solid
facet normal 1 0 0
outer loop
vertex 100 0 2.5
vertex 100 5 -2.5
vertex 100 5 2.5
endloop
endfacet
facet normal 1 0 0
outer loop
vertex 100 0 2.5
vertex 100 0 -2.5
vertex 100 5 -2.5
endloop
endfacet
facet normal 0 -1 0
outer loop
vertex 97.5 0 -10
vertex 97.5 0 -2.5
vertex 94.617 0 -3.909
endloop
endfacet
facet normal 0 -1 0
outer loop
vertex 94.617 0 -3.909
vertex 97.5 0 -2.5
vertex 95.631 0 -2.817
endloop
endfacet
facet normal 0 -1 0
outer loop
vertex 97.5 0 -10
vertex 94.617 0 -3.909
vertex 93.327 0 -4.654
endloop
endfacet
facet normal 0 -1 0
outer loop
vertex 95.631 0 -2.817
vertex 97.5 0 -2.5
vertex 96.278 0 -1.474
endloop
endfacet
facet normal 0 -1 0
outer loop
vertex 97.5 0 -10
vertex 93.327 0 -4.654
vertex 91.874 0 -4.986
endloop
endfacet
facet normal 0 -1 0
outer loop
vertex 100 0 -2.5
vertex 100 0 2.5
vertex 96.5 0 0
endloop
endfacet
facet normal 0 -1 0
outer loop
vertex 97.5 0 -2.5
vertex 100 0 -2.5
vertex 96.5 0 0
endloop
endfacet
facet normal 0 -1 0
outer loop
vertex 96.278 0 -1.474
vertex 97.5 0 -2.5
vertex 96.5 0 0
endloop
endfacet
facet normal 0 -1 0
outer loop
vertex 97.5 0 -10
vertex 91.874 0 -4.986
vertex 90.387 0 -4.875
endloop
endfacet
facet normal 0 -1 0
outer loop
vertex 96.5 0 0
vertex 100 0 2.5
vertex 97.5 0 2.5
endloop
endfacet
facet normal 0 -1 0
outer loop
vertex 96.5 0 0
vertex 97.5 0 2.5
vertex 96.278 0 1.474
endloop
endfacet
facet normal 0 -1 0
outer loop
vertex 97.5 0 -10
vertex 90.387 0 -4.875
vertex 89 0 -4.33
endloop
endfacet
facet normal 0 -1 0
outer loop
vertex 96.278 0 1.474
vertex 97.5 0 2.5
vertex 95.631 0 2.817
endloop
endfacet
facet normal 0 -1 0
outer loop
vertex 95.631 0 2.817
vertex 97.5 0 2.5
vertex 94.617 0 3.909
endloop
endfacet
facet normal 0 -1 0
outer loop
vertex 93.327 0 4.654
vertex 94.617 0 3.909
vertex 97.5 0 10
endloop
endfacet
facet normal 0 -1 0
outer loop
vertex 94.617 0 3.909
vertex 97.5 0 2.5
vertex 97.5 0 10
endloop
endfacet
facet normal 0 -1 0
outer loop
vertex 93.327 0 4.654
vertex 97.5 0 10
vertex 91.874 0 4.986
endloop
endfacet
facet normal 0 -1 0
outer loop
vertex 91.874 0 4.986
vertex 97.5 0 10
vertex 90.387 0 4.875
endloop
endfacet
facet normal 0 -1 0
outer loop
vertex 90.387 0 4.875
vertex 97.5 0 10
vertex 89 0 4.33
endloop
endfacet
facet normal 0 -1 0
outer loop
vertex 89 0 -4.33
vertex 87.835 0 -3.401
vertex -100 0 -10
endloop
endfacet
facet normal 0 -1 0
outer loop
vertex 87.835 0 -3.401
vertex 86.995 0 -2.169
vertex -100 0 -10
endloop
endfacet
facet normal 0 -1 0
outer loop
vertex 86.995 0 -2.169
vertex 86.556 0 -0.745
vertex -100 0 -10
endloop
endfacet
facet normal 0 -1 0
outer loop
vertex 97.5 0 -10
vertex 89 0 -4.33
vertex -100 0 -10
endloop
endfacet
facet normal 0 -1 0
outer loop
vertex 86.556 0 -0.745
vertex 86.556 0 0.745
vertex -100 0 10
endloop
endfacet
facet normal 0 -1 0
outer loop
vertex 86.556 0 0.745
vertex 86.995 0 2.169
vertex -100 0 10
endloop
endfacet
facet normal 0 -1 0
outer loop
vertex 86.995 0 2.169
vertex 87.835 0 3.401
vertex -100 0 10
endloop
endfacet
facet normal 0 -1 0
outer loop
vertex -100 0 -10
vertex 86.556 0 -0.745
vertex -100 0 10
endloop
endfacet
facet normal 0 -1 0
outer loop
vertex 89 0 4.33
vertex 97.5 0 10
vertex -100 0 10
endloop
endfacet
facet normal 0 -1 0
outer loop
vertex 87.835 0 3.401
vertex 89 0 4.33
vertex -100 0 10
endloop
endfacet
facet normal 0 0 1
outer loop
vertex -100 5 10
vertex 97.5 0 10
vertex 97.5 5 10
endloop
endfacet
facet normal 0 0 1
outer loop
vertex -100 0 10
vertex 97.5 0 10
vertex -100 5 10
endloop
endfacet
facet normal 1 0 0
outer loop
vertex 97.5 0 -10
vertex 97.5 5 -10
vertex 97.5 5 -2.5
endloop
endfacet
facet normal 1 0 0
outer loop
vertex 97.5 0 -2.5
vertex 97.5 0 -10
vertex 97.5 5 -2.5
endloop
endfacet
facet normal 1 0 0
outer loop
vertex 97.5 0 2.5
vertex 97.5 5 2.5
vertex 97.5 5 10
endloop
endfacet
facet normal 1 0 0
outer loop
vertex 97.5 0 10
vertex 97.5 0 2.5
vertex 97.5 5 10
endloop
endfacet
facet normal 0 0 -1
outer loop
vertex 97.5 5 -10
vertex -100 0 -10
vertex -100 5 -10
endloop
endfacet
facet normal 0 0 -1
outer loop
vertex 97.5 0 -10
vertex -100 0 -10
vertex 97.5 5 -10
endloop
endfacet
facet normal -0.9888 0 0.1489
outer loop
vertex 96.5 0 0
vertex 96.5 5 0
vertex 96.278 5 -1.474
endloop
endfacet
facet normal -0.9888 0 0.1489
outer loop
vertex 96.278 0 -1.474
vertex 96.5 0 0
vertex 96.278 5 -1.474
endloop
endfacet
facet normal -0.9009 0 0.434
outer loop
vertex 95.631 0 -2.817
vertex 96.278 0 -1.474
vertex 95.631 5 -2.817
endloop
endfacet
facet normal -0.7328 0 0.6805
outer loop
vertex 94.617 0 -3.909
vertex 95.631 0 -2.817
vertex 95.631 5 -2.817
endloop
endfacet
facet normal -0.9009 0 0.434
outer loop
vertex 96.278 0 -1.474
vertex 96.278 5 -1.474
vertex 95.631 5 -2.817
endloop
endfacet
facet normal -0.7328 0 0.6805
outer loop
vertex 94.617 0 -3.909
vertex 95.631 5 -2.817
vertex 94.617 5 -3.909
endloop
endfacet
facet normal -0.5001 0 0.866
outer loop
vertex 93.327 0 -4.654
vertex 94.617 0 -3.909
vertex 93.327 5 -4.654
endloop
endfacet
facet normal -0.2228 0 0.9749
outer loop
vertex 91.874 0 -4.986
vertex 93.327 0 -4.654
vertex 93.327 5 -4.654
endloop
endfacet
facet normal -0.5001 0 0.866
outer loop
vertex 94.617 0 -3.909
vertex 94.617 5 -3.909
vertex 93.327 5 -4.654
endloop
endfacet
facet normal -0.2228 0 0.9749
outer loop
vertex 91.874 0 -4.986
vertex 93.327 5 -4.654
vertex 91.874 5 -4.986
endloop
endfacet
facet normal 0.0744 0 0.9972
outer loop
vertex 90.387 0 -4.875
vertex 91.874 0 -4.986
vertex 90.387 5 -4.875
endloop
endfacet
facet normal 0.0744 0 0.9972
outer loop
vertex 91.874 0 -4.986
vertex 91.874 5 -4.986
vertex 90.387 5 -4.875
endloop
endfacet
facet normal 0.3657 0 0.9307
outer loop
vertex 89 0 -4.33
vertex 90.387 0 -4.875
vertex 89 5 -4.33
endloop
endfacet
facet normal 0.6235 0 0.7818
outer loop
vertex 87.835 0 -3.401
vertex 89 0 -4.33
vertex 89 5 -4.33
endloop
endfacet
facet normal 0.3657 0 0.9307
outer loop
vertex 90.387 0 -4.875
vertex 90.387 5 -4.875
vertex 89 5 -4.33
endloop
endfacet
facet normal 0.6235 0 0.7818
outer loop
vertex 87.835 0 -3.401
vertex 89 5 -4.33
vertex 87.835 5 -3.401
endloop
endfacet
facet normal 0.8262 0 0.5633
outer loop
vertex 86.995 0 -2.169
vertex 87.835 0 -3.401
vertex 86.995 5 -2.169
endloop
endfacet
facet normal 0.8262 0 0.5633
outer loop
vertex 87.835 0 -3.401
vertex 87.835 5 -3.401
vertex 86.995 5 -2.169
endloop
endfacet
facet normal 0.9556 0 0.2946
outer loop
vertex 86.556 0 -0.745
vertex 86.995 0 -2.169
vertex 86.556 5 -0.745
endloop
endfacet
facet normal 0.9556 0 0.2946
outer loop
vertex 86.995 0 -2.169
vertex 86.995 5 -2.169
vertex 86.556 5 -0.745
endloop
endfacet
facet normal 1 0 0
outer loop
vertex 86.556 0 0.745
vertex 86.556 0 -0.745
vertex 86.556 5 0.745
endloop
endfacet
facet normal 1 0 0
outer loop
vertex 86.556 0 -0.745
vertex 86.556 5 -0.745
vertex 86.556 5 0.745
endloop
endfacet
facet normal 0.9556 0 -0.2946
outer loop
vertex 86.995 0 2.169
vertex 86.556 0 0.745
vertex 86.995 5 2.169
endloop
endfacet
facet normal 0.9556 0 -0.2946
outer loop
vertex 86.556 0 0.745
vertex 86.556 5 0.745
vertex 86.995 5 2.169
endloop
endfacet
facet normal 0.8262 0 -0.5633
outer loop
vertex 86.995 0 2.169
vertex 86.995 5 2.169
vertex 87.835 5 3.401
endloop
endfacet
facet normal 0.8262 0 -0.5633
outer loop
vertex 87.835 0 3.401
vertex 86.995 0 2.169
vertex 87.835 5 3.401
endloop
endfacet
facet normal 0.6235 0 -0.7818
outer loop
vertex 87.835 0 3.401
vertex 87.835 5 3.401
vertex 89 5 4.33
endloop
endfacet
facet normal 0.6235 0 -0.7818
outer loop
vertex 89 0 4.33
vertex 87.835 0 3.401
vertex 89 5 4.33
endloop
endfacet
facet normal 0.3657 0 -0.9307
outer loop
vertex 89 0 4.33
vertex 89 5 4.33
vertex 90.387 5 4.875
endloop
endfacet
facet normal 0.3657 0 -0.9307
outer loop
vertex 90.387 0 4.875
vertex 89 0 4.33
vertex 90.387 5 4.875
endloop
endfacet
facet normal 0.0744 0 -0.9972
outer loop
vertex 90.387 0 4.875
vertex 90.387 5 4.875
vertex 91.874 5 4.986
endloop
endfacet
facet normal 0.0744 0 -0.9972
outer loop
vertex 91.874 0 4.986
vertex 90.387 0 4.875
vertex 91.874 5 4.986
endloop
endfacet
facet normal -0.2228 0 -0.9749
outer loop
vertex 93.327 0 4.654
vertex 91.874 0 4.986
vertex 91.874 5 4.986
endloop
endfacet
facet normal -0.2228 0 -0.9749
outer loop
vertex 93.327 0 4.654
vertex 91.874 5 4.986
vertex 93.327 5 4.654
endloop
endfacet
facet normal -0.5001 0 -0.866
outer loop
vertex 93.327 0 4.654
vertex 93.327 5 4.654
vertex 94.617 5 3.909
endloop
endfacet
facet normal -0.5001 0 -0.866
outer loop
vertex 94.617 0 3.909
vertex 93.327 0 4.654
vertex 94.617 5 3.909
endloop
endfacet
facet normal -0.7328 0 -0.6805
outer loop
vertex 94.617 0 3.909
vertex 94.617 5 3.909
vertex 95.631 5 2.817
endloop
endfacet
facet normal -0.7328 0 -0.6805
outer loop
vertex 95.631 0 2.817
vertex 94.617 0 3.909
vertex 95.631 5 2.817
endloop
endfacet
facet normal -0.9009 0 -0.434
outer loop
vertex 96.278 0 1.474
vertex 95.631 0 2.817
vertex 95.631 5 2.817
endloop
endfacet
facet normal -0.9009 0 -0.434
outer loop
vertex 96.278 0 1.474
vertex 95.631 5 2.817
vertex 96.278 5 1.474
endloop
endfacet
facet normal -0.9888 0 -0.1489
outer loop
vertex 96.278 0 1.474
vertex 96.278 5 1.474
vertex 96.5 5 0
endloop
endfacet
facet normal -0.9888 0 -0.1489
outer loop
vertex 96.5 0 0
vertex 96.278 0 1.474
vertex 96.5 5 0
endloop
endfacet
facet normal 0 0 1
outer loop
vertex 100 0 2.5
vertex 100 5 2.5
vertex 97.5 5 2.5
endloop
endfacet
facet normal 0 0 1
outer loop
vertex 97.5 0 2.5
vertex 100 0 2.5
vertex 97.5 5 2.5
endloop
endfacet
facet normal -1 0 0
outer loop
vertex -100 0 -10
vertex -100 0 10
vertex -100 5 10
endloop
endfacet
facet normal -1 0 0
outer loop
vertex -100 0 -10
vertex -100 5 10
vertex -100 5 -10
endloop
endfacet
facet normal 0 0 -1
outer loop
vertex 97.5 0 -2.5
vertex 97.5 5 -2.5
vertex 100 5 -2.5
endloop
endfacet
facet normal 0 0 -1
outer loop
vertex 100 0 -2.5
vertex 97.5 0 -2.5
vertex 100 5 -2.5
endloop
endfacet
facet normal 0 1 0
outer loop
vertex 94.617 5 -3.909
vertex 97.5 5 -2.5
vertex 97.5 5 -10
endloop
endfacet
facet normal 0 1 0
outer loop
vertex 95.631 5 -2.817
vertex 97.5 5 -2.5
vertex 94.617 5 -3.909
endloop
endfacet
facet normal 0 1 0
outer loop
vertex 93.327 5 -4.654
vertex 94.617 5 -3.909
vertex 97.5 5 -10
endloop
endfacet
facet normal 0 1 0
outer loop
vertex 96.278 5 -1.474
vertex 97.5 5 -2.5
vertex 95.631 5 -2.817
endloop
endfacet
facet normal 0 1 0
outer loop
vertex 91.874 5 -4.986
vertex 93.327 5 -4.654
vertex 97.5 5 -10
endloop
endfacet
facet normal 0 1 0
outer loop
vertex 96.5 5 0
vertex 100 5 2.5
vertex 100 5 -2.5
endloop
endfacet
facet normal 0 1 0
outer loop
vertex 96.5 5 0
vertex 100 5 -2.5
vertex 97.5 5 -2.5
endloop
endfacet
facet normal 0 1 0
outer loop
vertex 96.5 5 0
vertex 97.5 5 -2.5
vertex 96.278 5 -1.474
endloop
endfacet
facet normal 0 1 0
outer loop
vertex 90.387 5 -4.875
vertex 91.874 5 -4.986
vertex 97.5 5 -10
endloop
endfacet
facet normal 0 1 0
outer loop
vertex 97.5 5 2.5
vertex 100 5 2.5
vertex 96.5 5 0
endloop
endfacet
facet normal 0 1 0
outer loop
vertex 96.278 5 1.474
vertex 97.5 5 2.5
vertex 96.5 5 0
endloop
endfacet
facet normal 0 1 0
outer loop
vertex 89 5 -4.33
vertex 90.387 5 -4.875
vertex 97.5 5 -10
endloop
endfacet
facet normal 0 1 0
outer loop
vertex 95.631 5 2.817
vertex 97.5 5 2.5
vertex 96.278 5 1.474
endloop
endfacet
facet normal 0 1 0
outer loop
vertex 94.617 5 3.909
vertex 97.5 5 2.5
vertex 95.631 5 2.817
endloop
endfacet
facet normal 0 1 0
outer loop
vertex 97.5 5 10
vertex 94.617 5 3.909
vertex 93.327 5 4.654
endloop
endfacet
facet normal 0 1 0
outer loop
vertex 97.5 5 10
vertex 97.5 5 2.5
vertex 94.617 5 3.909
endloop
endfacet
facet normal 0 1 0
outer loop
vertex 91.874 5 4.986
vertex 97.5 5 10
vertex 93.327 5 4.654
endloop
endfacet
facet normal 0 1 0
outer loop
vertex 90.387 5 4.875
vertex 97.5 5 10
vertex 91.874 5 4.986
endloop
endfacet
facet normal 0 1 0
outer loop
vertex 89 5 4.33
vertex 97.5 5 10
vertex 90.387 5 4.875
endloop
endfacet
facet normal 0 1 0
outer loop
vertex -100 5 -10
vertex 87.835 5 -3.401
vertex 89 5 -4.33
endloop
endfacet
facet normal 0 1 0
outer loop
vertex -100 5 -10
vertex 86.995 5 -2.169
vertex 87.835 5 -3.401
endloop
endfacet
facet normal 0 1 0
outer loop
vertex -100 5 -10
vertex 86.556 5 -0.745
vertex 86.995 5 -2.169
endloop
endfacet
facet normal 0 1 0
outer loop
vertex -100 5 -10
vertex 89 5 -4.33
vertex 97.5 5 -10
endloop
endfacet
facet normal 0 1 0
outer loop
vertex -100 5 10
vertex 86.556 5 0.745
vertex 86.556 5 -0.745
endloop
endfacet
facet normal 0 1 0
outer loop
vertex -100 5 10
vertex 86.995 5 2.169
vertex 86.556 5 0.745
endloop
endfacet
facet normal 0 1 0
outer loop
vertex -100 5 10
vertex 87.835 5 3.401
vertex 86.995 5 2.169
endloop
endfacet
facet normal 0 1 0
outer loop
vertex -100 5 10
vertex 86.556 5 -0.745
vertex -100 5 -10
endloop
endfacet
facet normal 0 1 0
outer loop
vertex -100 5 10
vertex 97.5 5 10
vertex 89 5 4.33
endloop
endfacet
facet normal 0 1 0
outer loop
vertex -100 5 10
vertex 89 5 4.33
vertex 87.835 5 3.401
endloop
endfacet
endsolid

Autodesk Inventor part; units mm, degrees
ref_plane "YZ Plane" through (0, 0, 0) normal (1, 0, 0) x (0, 1, 0)
ref_plane "XZ Plane" through (0, 0, 0) normal (0, 1, 0) x (-1, 0, 0)
ref_plane "XY Plane" through (0, 0, 0) normal (0, 0, 1) x (1, 0, 0)
sketch "Sketch1" plane through (0, 0, 0) normal (0, 1, 0) x (-1, 0, 0)
  line L0 (-100, 10) -> (100, 10)
  line L1 (100, 10) -> (100, -10)
  line L2 (100, -10) -> (-100, -10)
  line L3 (-100, -10) -> (-100, 10)
  line L4 (-100, 10) -> (100, -10) construction
  line L5 (100, 10) -> (-100, -10) construction
  point P0 (0, 0)
  dimension "d0" = 200
  dimension "d1" = 20
extrude "Extrusion1" add sketch "Sketch1" along normal blind 5
sketch "Sketch2" plane through (0, 5, 0) normal (0, 1, 0) x (1, 0, 0)
  line L0 (97.5, 2.5) -> (102.5, 2.5)
  line L1 (102.5, 2.5) -> (102.5, -2.5)
  line L2 (102.5, -2.5) -> (97.5, -2.5)
  line L3 (97.5, -2.5) -> (97.5, 2.5)
  line L4 (100, -10) -> (100, 10) projected
  line L5 (97.5, 2.5) -> (102.5, -2.5) construction
  line L6 (102.5, 2.5) -> (97.5, -2.5) construction
  line L7 (97.5, -2.5) -> (97.5, -10)
  line L8 (-100, -10) -> (100, -10) projected
  line L9 (97.5, -10) -> (100, -10)
  line L10 (100, -10) -> (100, 10)
  line L11 (100, 10) -> (-100, 10) projected
  line L12 (97.5, 10) -> (97.5, 2.5)
  point P0 (0, 0)
  point P1 (100, 0)
  point P2 (100, 2.5)
  point P3 (100, -2.5)
  dimension "d4" = 5
  dimension "d5" = 5
extrude "Extrusion2" cut sketch "Sketch2" against normal blind 5 contours L12 L11 L4 L0 | L2 L4 L8 L7
sketch "Sketch3" plane through (0, 5, 0) normal (0, 1, 0) x (1, 0, 0)
  circle A0 centre (91.5, 0) radius 5
  line L0 (97.5, -10) -> (97.5, -2.5) projected
  point P0 (0, 0)
  dimension "d8" = 10
  dimension "d9" = 6
extrude "Extrusion3" cut sketch "Sketch3" against normal blind 5
properties part number "Zaxix" material "Wood (Birch)"
